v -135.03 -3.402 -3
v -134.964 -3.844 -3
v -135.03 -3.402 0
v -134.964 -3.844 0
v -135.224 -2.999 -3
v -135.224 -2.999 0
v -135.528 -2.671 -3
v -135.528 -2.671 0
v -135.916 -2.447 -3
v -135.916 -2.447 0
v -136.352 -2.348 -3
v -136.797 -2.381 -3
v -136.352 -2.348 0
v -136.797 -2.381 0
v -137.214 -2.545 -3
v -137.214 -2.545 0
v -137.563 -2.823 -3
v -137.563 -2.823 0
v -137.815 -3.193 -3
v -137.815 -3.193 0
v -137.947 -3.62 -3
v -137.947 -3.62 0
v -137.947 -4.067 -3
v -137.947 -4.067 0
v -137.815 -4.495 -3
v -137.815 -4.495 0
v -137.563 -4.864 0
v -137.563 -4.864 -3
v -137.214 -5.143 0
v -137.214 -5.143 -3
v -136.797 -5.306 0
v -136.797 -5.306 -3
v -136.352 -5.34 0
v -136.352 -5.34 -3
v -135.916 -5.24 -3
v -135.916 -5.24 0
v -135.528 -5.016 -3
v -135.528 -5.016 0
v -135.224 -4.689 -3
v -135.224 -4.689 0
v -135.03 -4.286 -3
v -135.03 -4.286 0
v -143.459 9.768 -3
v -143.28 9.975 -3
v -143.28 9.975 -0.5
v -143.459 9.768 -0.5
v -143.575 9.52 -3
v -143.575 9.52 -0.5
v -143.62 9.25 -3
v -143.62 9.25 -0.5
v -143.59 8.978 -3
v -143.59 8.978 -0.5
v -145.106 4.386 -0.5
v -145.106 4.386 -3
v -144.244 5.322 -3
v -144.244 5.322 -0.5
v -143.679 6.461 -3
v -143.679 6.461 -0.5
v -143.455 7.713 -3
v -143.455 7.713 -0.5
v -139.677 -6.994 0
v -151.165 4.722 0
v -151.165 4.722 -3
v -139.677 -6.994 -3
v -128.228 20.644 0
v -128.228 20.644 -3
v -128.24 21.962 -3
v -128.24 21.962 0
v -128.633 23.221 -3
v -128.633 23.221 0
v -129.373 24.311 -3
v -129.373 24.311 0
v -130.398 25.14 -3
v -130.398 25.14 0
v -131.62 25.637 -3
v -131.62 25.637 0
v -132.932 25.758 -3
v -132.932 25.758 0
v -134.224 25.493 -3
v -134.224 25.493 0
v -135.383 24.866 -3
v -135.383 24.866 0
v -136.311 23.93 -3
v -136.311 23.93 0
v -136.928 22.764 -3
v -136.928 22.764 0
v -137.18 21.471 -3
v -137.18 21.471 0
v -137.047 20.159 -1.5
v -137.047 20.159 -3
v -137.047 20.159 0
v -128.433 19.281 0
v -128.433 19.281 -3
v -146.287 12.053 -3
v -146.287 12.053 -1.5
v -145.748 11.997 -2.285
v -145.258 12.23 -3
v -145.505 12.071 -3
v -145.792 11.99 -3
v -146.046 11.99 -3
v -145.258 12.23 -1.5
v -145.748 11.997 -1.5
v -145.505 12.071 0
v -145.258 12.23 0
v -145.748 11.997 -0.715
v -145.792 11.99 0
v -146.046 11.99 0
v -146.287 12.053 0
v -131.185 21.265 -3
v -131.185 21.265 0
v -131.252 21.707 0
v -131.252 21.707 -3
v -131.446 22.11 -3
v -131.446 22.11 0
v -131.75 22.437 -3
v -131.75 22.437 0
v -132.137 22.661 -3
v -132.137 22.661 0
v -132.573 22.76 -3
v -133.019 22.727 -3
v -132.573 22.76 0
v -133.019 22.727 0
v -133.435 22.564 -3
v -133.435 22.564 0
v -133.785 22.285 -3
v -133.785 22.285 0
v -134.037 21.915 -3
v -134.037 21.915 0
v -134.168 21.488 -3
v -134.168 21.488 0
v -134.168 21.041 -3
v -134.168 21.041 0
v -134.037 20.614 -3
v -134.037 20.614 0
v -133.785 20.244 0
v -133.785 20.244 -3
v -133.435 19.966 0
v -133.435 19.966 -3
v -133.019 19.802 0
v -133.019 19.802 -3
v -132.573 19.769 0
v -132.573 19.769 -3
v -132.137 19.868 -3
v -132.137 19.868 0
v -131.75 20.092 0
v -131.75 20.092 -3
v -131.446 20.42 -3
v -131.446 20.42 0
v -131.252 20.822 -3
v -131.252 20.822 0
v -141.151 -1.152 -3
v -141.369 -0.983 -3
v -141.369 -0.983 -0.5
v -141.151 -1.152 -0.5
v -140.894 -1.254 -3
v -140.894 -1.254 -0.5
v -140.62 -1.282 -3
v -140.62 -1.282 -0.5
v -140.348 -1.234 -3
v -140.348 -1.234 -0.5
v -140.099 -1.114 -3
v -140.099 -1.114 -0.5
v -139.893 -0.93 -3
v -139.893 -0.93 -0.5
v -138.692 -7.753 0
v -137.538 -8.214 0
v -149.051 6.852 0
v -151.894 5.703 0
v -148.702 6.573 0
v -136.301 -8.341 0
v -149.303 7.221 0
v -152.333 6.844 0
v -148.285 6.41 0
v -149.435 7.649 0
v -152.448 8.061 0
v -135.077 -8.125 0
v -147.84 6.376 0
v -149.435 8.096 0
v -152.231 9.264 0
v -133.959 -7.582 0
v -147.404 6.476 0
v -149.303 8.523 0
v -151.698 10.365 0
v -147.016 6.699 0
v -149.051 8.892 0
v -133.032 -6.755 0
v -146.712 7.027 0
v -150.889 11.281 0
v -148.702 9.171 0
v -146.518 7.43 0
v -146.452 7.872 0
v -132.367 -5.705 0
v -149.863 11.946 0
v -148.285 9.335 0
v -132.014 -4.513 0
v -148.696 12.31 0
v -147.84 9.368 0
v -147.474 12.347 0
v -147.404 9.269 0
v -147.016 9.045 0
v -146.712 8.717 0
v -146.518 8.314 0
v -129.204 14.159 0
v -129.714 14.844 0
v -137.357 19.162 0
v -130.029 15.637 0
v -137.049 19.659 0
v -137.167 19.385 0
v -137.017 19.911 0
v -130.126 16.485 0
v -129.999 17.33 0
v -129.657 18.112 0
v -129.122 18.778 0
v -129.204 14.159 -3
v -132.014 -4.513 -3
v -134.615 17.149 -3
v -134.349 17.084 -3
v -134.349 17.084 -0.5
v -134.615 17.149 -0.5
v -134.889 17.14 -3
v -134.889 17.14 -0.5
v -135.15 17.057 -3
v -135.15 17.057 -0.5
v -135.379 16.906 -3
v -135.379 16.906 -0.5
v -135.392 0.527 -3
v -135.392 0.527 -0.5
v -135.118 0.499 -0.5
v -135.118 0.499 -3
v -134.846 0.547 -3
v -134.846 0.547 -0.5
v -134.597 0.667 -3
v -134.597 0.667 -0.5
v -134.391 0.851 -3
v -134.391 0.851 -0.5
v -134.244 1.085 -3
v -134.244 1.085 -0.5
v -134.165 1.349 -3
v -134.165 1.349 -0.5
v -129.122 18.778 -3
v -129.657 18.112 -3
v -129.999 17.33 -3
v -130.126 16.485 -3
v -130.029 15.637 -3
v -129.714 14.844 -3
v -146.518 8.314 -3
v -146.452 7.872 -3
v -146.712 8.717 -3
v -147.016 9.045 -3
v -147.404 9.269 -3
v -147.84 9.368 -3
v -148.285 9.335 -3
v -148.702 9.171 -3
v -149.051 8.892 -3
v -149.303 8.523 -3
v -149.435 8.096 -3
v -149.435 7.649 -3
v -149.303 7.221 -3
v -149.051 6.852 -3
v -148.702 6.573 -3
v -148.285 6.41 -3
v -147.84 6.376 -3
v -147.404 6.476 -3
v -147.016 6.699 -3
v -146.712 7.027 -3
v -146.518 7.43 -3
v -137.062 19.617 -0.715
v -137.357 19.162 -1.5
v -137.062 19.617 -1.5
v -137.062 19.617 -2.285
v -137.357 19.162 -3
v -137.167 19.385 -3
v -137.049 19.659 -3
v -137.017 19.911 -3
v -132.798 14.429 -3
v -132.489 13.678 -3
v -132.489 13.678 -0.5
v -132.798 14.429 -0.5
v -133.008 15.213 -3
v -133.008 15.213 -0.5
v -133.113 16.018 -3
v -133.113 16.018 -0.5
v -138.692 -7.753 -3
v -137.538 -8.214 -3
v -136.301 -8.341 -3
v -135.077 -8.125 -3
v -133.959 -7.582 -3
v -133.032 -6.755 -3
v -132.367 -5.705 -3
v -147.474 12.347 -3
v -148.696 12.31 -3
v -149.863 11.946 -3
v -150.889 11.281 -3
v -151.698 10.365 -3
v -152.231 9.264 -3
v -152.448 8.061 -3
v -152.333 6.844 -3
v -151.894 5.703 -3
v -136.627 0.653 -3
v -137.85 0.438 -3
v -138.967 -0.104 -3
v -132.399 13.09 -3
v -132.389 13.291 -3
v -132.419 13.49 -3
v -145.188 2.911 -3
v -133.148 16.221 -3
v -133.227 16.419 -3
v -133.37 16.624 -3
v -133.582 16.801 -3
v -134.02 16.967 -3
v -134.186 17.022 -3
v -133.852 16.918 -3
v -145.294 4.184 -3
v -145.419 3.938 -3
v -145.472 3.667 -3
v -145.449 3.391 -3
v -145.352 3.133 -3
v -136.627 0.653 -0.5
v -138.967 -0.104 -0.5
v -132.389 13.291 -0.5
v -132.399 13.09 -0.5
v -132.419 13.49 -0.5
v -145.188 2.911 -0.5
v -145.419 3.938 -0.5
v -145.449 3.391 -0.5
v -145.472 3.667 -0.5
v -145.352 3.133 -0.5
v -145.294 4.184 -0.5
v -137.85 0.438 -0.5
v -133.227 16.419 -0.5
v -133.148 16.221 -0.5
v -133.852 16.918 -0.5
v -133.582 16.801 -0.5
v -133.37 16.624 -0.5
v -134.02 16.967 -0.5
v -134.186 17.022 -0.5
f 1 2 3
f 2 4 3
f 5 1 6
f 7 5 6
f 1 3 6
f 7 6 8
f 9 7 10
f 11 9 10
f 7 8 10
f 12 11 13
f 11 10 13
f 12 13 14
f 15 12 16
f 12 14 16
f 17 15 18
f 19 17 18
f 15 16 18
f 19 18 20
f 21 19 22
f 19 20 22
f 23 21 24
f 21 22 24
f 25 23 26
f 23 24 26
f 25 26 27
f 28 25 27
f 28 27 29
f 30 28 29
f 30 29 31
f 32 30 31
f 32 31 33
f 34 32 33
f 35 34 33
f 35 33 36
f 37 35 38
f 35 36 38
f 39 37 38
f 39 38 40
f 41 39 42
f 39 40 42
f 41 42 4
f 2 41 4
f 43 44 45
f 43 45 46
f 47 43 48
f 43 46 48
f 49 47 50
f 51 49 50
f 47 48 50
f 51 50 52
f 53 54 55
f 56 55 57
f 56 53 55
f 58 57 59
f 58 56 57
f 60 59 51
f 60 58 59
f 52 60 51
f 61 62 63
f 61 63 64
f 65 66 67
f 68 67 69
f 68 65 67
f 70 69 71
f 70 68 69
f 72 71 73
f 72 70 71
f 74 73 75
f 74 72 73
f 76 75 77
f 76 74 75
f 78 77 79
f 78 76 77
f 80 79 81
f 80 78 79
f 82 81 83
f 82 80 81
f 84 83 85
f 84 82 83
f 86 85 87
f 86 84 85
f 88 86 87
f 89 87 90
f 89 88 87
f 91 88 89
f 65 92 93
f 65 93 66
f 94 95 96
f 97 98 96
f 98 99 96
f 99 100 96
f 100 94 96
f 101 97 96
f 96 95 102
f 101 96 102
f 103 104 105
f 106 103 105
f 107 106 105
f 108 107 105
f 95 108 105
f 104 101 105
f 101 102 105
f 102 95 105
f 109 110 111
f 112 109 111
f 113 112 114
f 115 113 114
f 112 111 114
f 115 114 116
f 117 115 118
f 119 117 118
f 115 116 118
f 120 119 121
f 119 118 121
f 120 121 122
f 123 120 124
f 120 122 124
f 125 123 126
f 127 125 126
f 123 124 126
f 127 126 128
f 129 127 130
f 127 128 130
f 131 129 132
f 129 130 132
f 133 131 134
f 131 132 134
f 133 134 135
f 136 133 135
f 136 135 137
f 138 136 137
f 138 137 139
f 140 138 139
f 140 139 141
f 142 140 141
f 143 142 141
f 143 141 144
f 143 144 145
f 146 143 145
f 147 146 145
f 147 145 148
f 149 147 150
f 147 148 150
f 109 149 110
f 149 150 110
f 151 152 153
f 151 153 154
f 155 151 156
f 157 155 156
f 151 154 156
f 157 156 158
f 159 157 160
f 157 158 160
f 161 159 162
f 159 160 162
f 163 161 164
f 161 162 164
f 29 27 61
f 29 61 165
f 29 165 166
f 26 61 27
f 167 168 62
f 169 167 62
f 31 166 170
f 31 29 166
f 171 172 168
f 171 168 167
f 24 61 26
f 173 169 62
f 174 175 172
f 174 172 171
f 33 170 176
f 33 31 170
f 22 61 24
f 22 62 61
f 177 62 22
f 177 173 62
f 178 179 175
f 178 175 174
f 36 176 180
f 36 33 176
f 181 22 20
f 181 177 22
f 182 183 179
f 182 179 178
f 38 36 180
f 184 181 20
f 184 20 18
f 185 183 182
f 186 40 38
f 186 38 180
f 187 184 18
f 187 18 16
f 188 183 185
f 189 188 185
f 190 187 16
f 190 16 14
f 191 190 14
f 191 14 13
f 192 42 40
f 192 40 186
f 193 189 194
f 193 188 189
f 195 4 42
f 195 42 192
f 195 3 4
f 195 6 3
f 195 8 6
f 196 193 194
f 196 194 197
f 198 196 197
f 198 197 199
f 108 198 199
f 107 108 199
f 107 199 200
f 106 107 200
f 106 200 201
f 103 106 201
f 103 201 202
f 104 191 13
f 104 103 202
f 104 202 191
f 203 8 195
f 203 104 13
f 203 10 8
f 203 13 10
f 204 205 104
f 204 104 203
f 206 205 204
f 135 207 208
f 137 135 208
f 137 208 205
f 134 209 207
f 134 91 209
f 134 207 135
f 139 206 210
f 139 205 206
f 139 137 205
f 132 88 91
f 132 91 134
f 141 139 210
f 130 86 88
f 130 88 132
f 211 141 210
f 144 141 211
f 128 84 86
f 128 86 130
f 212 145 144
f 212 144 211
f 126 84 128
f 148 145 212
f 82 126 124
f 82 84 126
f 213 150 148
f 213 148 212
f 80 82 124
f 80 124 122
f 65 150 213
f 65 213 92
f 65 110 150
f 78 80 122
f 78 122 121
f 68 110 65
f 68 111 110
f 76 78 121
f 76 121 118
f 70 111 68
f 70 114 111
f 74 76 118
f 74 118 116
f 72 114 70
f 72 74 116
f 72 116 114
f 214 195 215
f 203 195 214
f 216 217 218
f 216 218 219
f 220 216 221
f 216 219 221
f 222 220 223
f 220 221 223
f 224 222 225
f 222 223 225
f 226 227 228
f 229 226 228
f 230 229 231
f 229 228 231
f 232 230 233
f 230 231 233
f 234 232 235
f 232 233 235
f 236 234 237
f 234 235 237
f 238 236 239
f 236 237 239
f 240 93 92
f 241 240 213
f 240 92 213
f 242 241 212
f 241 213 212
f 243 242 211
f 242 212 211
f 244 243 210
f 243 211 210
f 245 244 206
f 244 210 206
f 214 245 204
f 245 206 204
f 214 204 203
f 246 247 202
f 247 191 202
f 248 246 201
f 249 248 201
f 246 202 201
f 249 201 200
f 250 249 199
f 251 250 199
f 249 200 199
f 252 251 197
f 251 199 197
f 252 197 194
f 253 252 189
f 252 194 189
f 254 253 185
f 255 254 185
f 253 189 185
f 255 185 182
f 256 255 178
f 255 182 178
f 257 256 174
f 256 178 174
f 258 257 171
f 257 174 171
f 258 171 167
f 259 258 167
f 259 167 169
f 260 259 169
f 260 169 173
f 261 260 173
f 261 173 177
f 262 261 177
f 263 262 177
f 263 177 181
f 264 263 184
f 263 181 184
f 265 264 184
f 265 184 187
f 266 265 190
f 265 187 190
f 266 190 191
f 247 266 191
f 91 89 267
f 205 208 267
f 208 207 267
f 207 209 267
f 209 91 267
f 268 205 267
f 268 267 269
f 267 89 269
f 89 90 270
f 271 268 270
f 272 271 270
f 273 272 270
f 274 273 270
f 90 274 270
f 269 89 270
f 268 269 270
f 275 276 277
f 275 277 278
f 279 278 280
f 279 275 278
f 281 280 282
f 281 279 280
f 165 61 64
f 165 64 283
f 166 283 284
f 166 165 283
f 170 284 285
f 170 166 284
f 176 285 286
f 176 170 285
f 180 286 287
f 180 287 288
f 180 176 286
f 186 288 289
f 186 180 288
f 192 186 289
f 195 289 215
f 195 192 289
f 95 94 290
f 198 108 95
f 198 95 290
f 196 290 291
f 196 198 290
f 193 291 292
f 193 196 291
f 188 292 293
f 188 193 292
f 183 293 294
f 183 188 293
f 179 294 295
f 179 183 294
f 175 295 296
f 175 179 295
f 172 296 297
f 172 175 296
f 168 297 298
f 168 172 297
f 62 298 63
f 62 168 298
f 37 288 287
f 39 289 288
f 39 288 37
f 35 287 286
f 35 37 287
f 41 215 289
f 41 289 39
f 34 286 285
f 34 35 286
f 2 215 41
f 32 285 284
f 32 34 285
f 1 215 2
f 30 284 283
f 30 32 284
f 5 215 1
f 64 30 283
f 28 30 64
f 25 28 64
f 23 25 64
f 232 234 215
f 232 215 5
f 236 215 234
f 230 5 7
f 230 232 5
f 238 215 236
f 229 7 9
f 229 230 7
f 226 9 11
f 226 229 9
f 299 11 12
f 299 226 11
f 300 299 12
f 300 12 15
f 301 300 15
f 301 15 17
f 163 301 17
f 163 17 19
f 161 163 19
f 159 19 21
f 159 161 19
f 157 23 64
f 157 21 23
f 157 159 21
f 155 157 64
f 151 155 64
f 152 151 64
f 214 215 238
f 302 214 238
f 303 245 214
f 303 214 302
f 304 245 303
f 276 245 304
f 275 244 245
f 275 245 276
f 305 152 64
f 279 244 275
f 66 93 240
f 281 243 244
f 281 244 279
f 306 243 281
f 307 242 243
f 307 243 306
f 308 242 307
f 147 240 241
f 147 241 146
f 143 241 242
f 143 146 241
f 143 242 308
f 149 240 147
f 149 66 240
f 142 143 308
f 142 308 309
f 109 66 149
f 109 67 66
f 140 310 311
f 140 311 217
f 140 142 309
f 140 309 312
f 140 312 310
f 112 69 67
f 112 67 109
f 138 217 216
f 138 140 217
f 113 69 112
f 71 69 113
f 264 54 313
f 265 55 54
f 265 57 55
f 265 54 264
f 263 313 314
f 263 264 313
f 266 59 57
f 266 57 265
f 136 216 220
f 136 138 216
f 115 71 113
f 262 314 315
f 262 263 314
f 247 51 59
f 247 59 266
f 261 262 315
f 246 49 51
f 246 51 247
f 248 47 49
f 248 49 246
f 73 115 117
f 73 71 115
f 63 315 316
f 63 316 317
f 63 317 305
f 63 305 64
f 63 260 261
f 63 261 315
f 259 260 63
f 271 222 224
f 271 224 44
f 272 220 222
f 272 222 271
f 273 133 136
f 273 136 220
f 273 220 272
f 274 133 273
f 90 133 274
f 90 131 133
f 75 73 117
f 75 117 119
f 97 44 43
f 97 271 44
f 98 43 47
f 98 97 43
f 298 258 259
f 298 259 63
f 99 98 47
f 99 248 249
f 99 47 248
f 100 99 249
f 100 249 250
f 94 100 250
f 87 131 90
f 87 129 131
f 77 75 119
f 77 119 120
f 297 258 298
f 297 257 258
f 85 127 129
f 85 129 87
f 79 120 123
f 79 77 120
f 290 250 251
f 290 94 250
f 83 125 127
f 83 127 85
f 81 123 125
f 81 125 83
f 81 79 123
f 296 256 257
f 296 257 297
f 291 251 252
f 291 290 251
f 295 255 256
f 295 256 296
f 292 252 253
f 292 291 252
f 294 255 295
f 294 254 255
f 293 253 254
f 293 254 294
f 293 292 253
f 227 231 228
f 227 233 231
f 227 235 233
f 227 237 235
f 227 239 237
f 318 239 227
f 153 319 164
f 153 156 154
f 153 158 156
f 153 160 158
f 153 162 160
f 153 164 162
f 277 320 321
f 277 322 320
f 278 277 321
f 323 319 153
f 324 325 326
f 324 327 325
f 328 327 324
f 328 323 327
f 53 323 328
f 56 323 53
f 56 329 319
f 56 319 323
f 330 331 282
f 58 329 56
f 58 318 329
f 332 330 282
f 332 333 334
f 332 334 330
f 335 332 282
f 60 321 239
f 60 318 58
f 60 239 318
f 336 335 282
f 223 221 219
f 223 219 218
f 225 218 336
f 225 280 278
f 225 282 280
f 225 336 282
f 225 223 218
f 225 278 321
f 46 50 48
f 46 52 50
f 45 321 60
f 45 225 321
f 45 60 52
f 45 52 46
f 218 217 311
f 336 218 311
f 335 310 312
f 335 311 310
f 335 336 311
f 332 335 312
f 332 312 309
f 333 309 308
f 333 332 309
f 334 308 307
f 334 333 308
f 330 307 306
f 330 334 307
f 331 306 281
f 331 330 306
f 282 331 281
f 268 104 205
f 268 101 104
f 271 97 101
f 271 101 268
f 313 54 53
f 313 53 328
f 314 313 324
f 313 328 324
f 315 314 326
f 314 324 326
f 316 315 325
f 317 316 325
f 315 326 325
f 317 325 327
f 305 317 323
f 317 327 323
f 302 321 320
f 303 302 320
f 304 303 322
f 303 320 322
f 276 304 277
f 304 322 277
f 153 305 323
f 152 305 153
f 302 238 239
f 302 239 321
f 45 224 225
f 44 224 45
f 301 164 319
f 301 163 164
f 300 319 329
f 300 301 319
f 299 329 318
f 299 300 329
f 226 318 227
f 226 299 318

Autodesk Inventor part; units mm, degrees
ref_plane "YZ Plane" through (0, 0, 0) normal (1, 0, 0) x (0, 1, 0)
ref_plane "XZ Plane" through (0, 0, 0) normal (0, 1, 0) x (-1, 0, 0)
ref_plane "XY Plane" through (0, 0, 0) normal (0, 0, 1) x (1, 0, 0)
sketch "スケッチ1" plane through (0, 0, 0) normal (0, 0, 1) x (1, 0, 0)
  circle A0 centre (-84.1159, 33.5789) radius 1.5
  circle A1 centre (-105.2485, 37.922) radius 1.5
  circle A2 centre (-132.6852, 21.2646) radius 1.5
  circle A3 centre (-77.8119, 54.5794) radius 1.5
  circle A4 centre (-112.1063, 12.5661) radius 1.5
  circle A5 centre (-60.4494, 64.5064) radius 1.5
  circle A6 centre (-64.4423, 49.0046) radius 1.5
  circle A7 centre (-44.4492, 64.0137) radius 1.5
  line L0 (-44.233, 71.0354) -> (-60.2332, 71.5281)
  arc A8 (-60.2332, 71.5281) -> (-64.0951, 70.5113) centre (-60.4494, 64.5064) ccw
  line L1 (-64.0951, 70.5113) -> (-153.1544, 16.4415)
  arc A9 (-153.1544, 16.4415) -> (-154.1888, 0.0236) centre (-147.9517, 7.8722) ccw
  line L2 (-154.1888, 0.0236) -> (-141.4408, -10.1069)
  arc A10 (-141.4408, -10.1069) -> (-131.6607, -10.2415) centre (-136.4636, -3.8437) ccw
  arc A11 (-40.2316, 58.3956) -> (-44.233, 71.0354) centre (-44.4492, 64.0137) ccw
  circle A12 centre (-147.9517, 7.8722) radius 1.5
  circle A13 centre (-136.4636, -3.8437) radius 1.5
  circle A14 centre (-132.6852, 21.2646) radius 1.5
  circle A15 centre (-132.6852, 21.2646) radius 4.5
  circle A16 centre (-147.9517, 7.8722) radius 4.5
  circle A17 centre (-136.4636, -3.8437) radius 1.5
  circle A18 centre (-136.4636, -3.8437) radius 4.5
  line L3 (-151.1648, 4.7216) -> (-139.6766, -6.9943)
  line L4 (-132.0137, -4.5133) -> (-128.2279, 20.6438)
  line L5 (-135.6527, 24.6475) -> (-150.9193, 11.255)
  circle A19 centre (-112.1063, 12.5661) radius 4.5
  point P0 (0, 0)
  point P1 (0, 0)
  point P2 (-128.2353, 20.595)
  dimension "d0" = 9
  dimension "d1" = 9
  dimension "d2" = 9
  dimension "d5" = 9
extrude "押し出し1" add sketch "スケッチ1" against normal blind 3 contours A15 L4 A18 L3 A16 L5 | A16 | A18
sketch "スケッチ2" plane through (0, 0, 0) normal (0, 0, 1) x (1, 0, 0)
  circle A0 centre (-142.0156, -13.6386) radius 1.5
  line L0 (-193.8461, -47.1997) -> (-168.4977, -27.8921)
  arc A1 (-162.0848, -31.6046) -> (-168.4977, -27.8921) centre (-166.0653, -31.0855) ccw
  line L1 (-162.0848, -31.6046) -> (-161.5284, -29.669)
  arc A2 (-161.365, -29.2693) -> (-161.5284, -29.669) centre (-159.6062, -30.2215) ccw
  line L2 (-161.365, -29.2693) -> (-154.7883, -17.1215)
  arc A3 (-151.2707, -19.0259) -> (-154.7883, -17.1215) centre (-153.0295, -18.0737) ccw
  line L3 (-151.2707, -19.0259) -> (-154.509, -25.0074)
  arc A4 (-154.509, -25.0074) -> (-153.0293, -26.2832) centre (-153.6296, -25.4835) ccw
  line L4 (-153.0293, -26.2832) -> (-128.1569, -7.6112)
  arc A5 (-128.1569, -7.6112) -> (-126.988, -5.6349) centre (-129.958, -5.212) ccw
  line L5 (-126.988, -5.6349) -> (-123.9066, 16.0052)
  arc A6 (-123.9066, 16.0052) -> (-127.0915, 19.4204) centre (-126.8767, 16.4281) ccw
  line L6 (-127.0915, 19.4204) -> (-130.5344, 19.1732)
  arc A7 (-134.5152, 18.8875) -> (-130.5344, 19.1732) centre (-132.6852, 21.2646) ccw
  line L7 (-134.5152, 18.8875) -> (-148.6695, 17.8715)
  arc A8 (-148.6695, 17.8715) -> (-157.1727, 11.806) centre (-147.9517, 7.8722) ccw
  line L8 (-157.1727, 11.806) -> (-166.1369, -9.2063)
  line L9 (-166.1369, -9.2063) -> (-193.8461, -47.1997)
  circle A9 centre (-126.8767, 16.4281) radius 1.5
  circle A10 centre (-158.5928, -9.2025) radius 1.5
  arc A11 (-128.5265, 10.8915) -> (-134.9494, 9.8931) centre (-131.7379, 10.3923) ccw
  arc A12 (-133.9759, -5.9529) -> (-128.5265, 10.8915) centre (-147.9517, 7.8722) ccw
  arc A13 (-138.597, -1.3817) -> (-133.9759, -5.9529) centre (-136.2864, -3.6673) ccw
  arc A14 (-138.597, -1.3817) -> (-134.9494, 9.8931) centre (-147.9517, 7.8722) ccw
  circle A15 centre (-147.9517, 7.8722) radius 4.025
  arc A16 (-150.9193, 11.255) -> (-151.1648, 4.7216) centre (-147.9517, 7.8722) ccw projected
  line L10 (-151.1648, 4.7216) -> (-139.6766, -6.9943) projected
  arc A17 (-139.6766, -6.9943) -> (-132.0137, -4.5133) centre (-136.4636, -3.8437) ccw projected
  line L11 (-132.0137, -4.5133) -> (-128.2353, 20.595) projected
  arc A18 (-128.2353, 20.595) -> (-135.6527, 24.6475) centre (-132.6852, 21.2646) ccw projected
  line L12 (-135.6527, 24.6475) -> (-150.9193, 11.255) projected
  circle A19 centre (-132.6852, 21.2646) radius 1.5 projected
  circle A20 centre (-147.9517, 7.8722) radius 1.5 projected
  circle A21 centre (-136.4636, -3.8437) radius 1.5 projected
  circle A22 centre (-126.8767, 16.4281) radius 3.25
  point P0 (0, 0)
  point P1 (0, 0)
  dimension "d6" = 6.5
extrude "押し出し2" cut sketch "スケッチ2" against normal blind 10 contours A22 L5 A6 L6 | L6 A6 L5 A22 L11 | L11 A22 | A9
sketch "スケッチ3" plane through (0, 0, -3) normal (0, 0, -1) x (-1, 0, 0)
  arc A0 (129.2038, 14.1593) -> (128.433, 19.2812) centre (126.8767, 16.4281) ccw projected
  line L0 (129.2038, 14.1593) -> (132.0137, -4.5133) projected
  arc A1 (132.0137, -4.5133) -> (139.6766, -6.9943) centre (136.4636, -3.8437) ccw projected
  line L1 (139.6766, -6.9943) -> (151.1648, 4.7216) projected
  arc A2 (151.1648, 4.7216) -> (150.9193, 11.255) centre (147.9517, 7.8722) ccw projected
  line L2 (150.9193, 11.255) -> (135.6527, 24.6475) projected
  arc A3 (135.6527, 24.6475) -> (128.2353, 20.595) centre (132.6852, 21.2646) ccw projected
  line L3 (128.2353, 20.595) -> (128.433, 19.2812) projected
  circle A4 centre (132.6852, 21.2646) radius 1.5 projected
  circle A5 centre (147.9517, 7.8722) radius 1.5 projected
  circle A6 centre (136.4636, -3.8437) radius 1.5 projected
  line L4 (149.0228, 6.822) -> (137.5346, -4.8939)
  arc A7 (134.9803, -4.0669) -> (137.5346, -4.8939) centre (136.4636, -3.8437) ccw
  line L5 (134.9803, -4.0669) -> (132.3502, 13.4109)
  arc A8 (132.3502, 13.4109) -> (131.2198, 20.9225) centre (126.8767, 16.4281) ccw
  line L6 (131.2198, 20.9225) -> (131.2019, 21.0414)
  arc A9 (133.6744, 22.3923) -> (131.2019, 21.0414) centre (132.6852, 21.2646) ccw
  line L7 (133.6744, 22.3923) -> (148.9409, 8.9998)
  arc A10 (149.0228, 6.822) -> (148.9409, 8.9998) centre (147.9517, 7.8722) ccw
  circle A11 centre (132.6852, 21.2646) radius 1.5 projected
  circle A12 centre (132.6852, 21.2646) radius 4.5
  circle A13 centre (147.9517, 7.8722) radius 4.5
  circle A14 centre (136.4636, -3.8437) radius 1.5 projected
  circle A15 centre (136.4636, -3.8437) radius 4.5
  point P0 (0, 0)
  point P1 (134.349, 0.1285)
  point P2 (140.505, -1.8646)
  point P3 (146.0523, 3.7927)
  point P4 (145.7516, 11.7976)
  point P5 (136.8637, 19.5944)
  point P6 (133.1164, 16.7854)
  dimension "d9" = 3
extrude "押し出し3" cut sketch "スケッチ3" against normal blind 2.5 contours A12 L7 A13 L4 A15 L5 A8
sketch "スケッチ4" plane through (0, 0, -3) normal (0, 0, -1) x (-1, 0, 0)
  line L0 (140.505, -1.8646) -> (146.0523, 3.7927) projected
  arc A0 (145.7516, 11.7976) -> (146.0523, 3.7927) centre (147.9517, 7.8722) ccw projected
  line L1 (145.7516, 11.7976) -> (136.8637, 19.5944) projected
  arc A1 (133.1164, 16.7854) -> (136.8637, 19.5944) centre (132.6852, 21.2646) ccw projected
  arc A2 (132.3502, 13.4109) -> (133.1164, 16.7854) centre (126.8767, 16.4281) ccw projected
  line L2 (132.3502, 13.4109) -> (134.349, 0.1285) projected
  arc A3 (140.505, -1.8646) -> (134.349, 0.1285) centre (136.4636, -3.8437) ccw projected
  circle A4 centre (136.4636, -3.8437) radius 1.5 projected
  circle A5 centre (147.9517, 7.8722) radius 1.5 projected
  circle A6 centre (132.6852, 21.2646) radius 1.5 projected
  line L3 (151.1648, 4.7216) -> (139.6766, -6.9943) projected
  arc A7 (132.0137, -4.5133) -> (139.6766, -6.9943) centre (136.4636, -3.8437) ccw projected
  line L4 (132.0137, -4.5133) -> (129.2038, 14.1593) projected
  arc A8 (129.2038, 14.1593) -> (128.433, 19.2812) centre (126.8767, 16.4281) ccw projected
  line L5 (128.433, 19.2812) -> (128.2353, 20.595) projected
  arc A9 (135.6527, 24.6475) -> (128.2353, 20.595) centre (132.6852, 21.2646) ccw projected
  line L6 (135.6527, 24.6475) -> (150.9193, 11.255) projected
  arc A10 (151.1648, 4.7216) -> (150.9193, 11.255) centre (147.9517, 7.8722) ccw projected
  line L7 (147.9517, 7.8722) -> (132.6852, 21.2646) construction
  line L8 (148.9409, 8.9998) -> (133.6744, 22.3923)
  line L9 (131.696, 20.137) -> (146.9626, 6.7446)
  arc A11 (146.9626, 6.7446) -> (148.9409, 8.9998) centre (147.9517, 7.8722) ccw
  arc A12 (133.6744, 22.3923) -> (131.696, 20.137) centre (132.6852, 21.2646) ccw
  circle A13 centre (132.6852, 21.2646) radius 4.5
  circle A14 centre (147.9517, 7.8722) radius 4.5
  point P0 (0, 0)
  point P1 (140.3185, 14.5684)
  point P2 (145.7516, 11.7976)
  point P3 (135.6527, 24.6475)
  point P4 (134.8854, 17.3392)
  point P5 (143.7732, 9.5424)
  dimension "d12" = 3
extrude "押し出し4" cut sketch "スケッチ4" against normal blind 10 contours L1 A13 L6 A14
extrude "押し出し5" add sketch "スケッチ4" against normal blind 3 contours L9 A1 L1 A0
sketch "スケッチ5" plane through (0, 0, -3) normal (0, 0, -1) x (-1, 0, 0)
  point P0 (0, 0)
fillet "フィレット1" radius 1 7 edges at (-134.8854, 17.3392, -1.75) (-133.1164, 16.7854, -1.75) (-132.3502, 13.4109, -1.75) (-143.7732, 9.5424, -1.75) (-146.0523, 3.7927, -1.75) (-140.505, -1.8646, -1.75) (-134.349, 0.1285, -1.75)
fillet "フィレット2" radius 1 2 edges at (-136.8637, 19.5944, -1.5) (-145.7516, 11.7976, -1.5)
properties part number "アーム ツインアーム先端押さえ" material "ポリカーボネート、クリア"
